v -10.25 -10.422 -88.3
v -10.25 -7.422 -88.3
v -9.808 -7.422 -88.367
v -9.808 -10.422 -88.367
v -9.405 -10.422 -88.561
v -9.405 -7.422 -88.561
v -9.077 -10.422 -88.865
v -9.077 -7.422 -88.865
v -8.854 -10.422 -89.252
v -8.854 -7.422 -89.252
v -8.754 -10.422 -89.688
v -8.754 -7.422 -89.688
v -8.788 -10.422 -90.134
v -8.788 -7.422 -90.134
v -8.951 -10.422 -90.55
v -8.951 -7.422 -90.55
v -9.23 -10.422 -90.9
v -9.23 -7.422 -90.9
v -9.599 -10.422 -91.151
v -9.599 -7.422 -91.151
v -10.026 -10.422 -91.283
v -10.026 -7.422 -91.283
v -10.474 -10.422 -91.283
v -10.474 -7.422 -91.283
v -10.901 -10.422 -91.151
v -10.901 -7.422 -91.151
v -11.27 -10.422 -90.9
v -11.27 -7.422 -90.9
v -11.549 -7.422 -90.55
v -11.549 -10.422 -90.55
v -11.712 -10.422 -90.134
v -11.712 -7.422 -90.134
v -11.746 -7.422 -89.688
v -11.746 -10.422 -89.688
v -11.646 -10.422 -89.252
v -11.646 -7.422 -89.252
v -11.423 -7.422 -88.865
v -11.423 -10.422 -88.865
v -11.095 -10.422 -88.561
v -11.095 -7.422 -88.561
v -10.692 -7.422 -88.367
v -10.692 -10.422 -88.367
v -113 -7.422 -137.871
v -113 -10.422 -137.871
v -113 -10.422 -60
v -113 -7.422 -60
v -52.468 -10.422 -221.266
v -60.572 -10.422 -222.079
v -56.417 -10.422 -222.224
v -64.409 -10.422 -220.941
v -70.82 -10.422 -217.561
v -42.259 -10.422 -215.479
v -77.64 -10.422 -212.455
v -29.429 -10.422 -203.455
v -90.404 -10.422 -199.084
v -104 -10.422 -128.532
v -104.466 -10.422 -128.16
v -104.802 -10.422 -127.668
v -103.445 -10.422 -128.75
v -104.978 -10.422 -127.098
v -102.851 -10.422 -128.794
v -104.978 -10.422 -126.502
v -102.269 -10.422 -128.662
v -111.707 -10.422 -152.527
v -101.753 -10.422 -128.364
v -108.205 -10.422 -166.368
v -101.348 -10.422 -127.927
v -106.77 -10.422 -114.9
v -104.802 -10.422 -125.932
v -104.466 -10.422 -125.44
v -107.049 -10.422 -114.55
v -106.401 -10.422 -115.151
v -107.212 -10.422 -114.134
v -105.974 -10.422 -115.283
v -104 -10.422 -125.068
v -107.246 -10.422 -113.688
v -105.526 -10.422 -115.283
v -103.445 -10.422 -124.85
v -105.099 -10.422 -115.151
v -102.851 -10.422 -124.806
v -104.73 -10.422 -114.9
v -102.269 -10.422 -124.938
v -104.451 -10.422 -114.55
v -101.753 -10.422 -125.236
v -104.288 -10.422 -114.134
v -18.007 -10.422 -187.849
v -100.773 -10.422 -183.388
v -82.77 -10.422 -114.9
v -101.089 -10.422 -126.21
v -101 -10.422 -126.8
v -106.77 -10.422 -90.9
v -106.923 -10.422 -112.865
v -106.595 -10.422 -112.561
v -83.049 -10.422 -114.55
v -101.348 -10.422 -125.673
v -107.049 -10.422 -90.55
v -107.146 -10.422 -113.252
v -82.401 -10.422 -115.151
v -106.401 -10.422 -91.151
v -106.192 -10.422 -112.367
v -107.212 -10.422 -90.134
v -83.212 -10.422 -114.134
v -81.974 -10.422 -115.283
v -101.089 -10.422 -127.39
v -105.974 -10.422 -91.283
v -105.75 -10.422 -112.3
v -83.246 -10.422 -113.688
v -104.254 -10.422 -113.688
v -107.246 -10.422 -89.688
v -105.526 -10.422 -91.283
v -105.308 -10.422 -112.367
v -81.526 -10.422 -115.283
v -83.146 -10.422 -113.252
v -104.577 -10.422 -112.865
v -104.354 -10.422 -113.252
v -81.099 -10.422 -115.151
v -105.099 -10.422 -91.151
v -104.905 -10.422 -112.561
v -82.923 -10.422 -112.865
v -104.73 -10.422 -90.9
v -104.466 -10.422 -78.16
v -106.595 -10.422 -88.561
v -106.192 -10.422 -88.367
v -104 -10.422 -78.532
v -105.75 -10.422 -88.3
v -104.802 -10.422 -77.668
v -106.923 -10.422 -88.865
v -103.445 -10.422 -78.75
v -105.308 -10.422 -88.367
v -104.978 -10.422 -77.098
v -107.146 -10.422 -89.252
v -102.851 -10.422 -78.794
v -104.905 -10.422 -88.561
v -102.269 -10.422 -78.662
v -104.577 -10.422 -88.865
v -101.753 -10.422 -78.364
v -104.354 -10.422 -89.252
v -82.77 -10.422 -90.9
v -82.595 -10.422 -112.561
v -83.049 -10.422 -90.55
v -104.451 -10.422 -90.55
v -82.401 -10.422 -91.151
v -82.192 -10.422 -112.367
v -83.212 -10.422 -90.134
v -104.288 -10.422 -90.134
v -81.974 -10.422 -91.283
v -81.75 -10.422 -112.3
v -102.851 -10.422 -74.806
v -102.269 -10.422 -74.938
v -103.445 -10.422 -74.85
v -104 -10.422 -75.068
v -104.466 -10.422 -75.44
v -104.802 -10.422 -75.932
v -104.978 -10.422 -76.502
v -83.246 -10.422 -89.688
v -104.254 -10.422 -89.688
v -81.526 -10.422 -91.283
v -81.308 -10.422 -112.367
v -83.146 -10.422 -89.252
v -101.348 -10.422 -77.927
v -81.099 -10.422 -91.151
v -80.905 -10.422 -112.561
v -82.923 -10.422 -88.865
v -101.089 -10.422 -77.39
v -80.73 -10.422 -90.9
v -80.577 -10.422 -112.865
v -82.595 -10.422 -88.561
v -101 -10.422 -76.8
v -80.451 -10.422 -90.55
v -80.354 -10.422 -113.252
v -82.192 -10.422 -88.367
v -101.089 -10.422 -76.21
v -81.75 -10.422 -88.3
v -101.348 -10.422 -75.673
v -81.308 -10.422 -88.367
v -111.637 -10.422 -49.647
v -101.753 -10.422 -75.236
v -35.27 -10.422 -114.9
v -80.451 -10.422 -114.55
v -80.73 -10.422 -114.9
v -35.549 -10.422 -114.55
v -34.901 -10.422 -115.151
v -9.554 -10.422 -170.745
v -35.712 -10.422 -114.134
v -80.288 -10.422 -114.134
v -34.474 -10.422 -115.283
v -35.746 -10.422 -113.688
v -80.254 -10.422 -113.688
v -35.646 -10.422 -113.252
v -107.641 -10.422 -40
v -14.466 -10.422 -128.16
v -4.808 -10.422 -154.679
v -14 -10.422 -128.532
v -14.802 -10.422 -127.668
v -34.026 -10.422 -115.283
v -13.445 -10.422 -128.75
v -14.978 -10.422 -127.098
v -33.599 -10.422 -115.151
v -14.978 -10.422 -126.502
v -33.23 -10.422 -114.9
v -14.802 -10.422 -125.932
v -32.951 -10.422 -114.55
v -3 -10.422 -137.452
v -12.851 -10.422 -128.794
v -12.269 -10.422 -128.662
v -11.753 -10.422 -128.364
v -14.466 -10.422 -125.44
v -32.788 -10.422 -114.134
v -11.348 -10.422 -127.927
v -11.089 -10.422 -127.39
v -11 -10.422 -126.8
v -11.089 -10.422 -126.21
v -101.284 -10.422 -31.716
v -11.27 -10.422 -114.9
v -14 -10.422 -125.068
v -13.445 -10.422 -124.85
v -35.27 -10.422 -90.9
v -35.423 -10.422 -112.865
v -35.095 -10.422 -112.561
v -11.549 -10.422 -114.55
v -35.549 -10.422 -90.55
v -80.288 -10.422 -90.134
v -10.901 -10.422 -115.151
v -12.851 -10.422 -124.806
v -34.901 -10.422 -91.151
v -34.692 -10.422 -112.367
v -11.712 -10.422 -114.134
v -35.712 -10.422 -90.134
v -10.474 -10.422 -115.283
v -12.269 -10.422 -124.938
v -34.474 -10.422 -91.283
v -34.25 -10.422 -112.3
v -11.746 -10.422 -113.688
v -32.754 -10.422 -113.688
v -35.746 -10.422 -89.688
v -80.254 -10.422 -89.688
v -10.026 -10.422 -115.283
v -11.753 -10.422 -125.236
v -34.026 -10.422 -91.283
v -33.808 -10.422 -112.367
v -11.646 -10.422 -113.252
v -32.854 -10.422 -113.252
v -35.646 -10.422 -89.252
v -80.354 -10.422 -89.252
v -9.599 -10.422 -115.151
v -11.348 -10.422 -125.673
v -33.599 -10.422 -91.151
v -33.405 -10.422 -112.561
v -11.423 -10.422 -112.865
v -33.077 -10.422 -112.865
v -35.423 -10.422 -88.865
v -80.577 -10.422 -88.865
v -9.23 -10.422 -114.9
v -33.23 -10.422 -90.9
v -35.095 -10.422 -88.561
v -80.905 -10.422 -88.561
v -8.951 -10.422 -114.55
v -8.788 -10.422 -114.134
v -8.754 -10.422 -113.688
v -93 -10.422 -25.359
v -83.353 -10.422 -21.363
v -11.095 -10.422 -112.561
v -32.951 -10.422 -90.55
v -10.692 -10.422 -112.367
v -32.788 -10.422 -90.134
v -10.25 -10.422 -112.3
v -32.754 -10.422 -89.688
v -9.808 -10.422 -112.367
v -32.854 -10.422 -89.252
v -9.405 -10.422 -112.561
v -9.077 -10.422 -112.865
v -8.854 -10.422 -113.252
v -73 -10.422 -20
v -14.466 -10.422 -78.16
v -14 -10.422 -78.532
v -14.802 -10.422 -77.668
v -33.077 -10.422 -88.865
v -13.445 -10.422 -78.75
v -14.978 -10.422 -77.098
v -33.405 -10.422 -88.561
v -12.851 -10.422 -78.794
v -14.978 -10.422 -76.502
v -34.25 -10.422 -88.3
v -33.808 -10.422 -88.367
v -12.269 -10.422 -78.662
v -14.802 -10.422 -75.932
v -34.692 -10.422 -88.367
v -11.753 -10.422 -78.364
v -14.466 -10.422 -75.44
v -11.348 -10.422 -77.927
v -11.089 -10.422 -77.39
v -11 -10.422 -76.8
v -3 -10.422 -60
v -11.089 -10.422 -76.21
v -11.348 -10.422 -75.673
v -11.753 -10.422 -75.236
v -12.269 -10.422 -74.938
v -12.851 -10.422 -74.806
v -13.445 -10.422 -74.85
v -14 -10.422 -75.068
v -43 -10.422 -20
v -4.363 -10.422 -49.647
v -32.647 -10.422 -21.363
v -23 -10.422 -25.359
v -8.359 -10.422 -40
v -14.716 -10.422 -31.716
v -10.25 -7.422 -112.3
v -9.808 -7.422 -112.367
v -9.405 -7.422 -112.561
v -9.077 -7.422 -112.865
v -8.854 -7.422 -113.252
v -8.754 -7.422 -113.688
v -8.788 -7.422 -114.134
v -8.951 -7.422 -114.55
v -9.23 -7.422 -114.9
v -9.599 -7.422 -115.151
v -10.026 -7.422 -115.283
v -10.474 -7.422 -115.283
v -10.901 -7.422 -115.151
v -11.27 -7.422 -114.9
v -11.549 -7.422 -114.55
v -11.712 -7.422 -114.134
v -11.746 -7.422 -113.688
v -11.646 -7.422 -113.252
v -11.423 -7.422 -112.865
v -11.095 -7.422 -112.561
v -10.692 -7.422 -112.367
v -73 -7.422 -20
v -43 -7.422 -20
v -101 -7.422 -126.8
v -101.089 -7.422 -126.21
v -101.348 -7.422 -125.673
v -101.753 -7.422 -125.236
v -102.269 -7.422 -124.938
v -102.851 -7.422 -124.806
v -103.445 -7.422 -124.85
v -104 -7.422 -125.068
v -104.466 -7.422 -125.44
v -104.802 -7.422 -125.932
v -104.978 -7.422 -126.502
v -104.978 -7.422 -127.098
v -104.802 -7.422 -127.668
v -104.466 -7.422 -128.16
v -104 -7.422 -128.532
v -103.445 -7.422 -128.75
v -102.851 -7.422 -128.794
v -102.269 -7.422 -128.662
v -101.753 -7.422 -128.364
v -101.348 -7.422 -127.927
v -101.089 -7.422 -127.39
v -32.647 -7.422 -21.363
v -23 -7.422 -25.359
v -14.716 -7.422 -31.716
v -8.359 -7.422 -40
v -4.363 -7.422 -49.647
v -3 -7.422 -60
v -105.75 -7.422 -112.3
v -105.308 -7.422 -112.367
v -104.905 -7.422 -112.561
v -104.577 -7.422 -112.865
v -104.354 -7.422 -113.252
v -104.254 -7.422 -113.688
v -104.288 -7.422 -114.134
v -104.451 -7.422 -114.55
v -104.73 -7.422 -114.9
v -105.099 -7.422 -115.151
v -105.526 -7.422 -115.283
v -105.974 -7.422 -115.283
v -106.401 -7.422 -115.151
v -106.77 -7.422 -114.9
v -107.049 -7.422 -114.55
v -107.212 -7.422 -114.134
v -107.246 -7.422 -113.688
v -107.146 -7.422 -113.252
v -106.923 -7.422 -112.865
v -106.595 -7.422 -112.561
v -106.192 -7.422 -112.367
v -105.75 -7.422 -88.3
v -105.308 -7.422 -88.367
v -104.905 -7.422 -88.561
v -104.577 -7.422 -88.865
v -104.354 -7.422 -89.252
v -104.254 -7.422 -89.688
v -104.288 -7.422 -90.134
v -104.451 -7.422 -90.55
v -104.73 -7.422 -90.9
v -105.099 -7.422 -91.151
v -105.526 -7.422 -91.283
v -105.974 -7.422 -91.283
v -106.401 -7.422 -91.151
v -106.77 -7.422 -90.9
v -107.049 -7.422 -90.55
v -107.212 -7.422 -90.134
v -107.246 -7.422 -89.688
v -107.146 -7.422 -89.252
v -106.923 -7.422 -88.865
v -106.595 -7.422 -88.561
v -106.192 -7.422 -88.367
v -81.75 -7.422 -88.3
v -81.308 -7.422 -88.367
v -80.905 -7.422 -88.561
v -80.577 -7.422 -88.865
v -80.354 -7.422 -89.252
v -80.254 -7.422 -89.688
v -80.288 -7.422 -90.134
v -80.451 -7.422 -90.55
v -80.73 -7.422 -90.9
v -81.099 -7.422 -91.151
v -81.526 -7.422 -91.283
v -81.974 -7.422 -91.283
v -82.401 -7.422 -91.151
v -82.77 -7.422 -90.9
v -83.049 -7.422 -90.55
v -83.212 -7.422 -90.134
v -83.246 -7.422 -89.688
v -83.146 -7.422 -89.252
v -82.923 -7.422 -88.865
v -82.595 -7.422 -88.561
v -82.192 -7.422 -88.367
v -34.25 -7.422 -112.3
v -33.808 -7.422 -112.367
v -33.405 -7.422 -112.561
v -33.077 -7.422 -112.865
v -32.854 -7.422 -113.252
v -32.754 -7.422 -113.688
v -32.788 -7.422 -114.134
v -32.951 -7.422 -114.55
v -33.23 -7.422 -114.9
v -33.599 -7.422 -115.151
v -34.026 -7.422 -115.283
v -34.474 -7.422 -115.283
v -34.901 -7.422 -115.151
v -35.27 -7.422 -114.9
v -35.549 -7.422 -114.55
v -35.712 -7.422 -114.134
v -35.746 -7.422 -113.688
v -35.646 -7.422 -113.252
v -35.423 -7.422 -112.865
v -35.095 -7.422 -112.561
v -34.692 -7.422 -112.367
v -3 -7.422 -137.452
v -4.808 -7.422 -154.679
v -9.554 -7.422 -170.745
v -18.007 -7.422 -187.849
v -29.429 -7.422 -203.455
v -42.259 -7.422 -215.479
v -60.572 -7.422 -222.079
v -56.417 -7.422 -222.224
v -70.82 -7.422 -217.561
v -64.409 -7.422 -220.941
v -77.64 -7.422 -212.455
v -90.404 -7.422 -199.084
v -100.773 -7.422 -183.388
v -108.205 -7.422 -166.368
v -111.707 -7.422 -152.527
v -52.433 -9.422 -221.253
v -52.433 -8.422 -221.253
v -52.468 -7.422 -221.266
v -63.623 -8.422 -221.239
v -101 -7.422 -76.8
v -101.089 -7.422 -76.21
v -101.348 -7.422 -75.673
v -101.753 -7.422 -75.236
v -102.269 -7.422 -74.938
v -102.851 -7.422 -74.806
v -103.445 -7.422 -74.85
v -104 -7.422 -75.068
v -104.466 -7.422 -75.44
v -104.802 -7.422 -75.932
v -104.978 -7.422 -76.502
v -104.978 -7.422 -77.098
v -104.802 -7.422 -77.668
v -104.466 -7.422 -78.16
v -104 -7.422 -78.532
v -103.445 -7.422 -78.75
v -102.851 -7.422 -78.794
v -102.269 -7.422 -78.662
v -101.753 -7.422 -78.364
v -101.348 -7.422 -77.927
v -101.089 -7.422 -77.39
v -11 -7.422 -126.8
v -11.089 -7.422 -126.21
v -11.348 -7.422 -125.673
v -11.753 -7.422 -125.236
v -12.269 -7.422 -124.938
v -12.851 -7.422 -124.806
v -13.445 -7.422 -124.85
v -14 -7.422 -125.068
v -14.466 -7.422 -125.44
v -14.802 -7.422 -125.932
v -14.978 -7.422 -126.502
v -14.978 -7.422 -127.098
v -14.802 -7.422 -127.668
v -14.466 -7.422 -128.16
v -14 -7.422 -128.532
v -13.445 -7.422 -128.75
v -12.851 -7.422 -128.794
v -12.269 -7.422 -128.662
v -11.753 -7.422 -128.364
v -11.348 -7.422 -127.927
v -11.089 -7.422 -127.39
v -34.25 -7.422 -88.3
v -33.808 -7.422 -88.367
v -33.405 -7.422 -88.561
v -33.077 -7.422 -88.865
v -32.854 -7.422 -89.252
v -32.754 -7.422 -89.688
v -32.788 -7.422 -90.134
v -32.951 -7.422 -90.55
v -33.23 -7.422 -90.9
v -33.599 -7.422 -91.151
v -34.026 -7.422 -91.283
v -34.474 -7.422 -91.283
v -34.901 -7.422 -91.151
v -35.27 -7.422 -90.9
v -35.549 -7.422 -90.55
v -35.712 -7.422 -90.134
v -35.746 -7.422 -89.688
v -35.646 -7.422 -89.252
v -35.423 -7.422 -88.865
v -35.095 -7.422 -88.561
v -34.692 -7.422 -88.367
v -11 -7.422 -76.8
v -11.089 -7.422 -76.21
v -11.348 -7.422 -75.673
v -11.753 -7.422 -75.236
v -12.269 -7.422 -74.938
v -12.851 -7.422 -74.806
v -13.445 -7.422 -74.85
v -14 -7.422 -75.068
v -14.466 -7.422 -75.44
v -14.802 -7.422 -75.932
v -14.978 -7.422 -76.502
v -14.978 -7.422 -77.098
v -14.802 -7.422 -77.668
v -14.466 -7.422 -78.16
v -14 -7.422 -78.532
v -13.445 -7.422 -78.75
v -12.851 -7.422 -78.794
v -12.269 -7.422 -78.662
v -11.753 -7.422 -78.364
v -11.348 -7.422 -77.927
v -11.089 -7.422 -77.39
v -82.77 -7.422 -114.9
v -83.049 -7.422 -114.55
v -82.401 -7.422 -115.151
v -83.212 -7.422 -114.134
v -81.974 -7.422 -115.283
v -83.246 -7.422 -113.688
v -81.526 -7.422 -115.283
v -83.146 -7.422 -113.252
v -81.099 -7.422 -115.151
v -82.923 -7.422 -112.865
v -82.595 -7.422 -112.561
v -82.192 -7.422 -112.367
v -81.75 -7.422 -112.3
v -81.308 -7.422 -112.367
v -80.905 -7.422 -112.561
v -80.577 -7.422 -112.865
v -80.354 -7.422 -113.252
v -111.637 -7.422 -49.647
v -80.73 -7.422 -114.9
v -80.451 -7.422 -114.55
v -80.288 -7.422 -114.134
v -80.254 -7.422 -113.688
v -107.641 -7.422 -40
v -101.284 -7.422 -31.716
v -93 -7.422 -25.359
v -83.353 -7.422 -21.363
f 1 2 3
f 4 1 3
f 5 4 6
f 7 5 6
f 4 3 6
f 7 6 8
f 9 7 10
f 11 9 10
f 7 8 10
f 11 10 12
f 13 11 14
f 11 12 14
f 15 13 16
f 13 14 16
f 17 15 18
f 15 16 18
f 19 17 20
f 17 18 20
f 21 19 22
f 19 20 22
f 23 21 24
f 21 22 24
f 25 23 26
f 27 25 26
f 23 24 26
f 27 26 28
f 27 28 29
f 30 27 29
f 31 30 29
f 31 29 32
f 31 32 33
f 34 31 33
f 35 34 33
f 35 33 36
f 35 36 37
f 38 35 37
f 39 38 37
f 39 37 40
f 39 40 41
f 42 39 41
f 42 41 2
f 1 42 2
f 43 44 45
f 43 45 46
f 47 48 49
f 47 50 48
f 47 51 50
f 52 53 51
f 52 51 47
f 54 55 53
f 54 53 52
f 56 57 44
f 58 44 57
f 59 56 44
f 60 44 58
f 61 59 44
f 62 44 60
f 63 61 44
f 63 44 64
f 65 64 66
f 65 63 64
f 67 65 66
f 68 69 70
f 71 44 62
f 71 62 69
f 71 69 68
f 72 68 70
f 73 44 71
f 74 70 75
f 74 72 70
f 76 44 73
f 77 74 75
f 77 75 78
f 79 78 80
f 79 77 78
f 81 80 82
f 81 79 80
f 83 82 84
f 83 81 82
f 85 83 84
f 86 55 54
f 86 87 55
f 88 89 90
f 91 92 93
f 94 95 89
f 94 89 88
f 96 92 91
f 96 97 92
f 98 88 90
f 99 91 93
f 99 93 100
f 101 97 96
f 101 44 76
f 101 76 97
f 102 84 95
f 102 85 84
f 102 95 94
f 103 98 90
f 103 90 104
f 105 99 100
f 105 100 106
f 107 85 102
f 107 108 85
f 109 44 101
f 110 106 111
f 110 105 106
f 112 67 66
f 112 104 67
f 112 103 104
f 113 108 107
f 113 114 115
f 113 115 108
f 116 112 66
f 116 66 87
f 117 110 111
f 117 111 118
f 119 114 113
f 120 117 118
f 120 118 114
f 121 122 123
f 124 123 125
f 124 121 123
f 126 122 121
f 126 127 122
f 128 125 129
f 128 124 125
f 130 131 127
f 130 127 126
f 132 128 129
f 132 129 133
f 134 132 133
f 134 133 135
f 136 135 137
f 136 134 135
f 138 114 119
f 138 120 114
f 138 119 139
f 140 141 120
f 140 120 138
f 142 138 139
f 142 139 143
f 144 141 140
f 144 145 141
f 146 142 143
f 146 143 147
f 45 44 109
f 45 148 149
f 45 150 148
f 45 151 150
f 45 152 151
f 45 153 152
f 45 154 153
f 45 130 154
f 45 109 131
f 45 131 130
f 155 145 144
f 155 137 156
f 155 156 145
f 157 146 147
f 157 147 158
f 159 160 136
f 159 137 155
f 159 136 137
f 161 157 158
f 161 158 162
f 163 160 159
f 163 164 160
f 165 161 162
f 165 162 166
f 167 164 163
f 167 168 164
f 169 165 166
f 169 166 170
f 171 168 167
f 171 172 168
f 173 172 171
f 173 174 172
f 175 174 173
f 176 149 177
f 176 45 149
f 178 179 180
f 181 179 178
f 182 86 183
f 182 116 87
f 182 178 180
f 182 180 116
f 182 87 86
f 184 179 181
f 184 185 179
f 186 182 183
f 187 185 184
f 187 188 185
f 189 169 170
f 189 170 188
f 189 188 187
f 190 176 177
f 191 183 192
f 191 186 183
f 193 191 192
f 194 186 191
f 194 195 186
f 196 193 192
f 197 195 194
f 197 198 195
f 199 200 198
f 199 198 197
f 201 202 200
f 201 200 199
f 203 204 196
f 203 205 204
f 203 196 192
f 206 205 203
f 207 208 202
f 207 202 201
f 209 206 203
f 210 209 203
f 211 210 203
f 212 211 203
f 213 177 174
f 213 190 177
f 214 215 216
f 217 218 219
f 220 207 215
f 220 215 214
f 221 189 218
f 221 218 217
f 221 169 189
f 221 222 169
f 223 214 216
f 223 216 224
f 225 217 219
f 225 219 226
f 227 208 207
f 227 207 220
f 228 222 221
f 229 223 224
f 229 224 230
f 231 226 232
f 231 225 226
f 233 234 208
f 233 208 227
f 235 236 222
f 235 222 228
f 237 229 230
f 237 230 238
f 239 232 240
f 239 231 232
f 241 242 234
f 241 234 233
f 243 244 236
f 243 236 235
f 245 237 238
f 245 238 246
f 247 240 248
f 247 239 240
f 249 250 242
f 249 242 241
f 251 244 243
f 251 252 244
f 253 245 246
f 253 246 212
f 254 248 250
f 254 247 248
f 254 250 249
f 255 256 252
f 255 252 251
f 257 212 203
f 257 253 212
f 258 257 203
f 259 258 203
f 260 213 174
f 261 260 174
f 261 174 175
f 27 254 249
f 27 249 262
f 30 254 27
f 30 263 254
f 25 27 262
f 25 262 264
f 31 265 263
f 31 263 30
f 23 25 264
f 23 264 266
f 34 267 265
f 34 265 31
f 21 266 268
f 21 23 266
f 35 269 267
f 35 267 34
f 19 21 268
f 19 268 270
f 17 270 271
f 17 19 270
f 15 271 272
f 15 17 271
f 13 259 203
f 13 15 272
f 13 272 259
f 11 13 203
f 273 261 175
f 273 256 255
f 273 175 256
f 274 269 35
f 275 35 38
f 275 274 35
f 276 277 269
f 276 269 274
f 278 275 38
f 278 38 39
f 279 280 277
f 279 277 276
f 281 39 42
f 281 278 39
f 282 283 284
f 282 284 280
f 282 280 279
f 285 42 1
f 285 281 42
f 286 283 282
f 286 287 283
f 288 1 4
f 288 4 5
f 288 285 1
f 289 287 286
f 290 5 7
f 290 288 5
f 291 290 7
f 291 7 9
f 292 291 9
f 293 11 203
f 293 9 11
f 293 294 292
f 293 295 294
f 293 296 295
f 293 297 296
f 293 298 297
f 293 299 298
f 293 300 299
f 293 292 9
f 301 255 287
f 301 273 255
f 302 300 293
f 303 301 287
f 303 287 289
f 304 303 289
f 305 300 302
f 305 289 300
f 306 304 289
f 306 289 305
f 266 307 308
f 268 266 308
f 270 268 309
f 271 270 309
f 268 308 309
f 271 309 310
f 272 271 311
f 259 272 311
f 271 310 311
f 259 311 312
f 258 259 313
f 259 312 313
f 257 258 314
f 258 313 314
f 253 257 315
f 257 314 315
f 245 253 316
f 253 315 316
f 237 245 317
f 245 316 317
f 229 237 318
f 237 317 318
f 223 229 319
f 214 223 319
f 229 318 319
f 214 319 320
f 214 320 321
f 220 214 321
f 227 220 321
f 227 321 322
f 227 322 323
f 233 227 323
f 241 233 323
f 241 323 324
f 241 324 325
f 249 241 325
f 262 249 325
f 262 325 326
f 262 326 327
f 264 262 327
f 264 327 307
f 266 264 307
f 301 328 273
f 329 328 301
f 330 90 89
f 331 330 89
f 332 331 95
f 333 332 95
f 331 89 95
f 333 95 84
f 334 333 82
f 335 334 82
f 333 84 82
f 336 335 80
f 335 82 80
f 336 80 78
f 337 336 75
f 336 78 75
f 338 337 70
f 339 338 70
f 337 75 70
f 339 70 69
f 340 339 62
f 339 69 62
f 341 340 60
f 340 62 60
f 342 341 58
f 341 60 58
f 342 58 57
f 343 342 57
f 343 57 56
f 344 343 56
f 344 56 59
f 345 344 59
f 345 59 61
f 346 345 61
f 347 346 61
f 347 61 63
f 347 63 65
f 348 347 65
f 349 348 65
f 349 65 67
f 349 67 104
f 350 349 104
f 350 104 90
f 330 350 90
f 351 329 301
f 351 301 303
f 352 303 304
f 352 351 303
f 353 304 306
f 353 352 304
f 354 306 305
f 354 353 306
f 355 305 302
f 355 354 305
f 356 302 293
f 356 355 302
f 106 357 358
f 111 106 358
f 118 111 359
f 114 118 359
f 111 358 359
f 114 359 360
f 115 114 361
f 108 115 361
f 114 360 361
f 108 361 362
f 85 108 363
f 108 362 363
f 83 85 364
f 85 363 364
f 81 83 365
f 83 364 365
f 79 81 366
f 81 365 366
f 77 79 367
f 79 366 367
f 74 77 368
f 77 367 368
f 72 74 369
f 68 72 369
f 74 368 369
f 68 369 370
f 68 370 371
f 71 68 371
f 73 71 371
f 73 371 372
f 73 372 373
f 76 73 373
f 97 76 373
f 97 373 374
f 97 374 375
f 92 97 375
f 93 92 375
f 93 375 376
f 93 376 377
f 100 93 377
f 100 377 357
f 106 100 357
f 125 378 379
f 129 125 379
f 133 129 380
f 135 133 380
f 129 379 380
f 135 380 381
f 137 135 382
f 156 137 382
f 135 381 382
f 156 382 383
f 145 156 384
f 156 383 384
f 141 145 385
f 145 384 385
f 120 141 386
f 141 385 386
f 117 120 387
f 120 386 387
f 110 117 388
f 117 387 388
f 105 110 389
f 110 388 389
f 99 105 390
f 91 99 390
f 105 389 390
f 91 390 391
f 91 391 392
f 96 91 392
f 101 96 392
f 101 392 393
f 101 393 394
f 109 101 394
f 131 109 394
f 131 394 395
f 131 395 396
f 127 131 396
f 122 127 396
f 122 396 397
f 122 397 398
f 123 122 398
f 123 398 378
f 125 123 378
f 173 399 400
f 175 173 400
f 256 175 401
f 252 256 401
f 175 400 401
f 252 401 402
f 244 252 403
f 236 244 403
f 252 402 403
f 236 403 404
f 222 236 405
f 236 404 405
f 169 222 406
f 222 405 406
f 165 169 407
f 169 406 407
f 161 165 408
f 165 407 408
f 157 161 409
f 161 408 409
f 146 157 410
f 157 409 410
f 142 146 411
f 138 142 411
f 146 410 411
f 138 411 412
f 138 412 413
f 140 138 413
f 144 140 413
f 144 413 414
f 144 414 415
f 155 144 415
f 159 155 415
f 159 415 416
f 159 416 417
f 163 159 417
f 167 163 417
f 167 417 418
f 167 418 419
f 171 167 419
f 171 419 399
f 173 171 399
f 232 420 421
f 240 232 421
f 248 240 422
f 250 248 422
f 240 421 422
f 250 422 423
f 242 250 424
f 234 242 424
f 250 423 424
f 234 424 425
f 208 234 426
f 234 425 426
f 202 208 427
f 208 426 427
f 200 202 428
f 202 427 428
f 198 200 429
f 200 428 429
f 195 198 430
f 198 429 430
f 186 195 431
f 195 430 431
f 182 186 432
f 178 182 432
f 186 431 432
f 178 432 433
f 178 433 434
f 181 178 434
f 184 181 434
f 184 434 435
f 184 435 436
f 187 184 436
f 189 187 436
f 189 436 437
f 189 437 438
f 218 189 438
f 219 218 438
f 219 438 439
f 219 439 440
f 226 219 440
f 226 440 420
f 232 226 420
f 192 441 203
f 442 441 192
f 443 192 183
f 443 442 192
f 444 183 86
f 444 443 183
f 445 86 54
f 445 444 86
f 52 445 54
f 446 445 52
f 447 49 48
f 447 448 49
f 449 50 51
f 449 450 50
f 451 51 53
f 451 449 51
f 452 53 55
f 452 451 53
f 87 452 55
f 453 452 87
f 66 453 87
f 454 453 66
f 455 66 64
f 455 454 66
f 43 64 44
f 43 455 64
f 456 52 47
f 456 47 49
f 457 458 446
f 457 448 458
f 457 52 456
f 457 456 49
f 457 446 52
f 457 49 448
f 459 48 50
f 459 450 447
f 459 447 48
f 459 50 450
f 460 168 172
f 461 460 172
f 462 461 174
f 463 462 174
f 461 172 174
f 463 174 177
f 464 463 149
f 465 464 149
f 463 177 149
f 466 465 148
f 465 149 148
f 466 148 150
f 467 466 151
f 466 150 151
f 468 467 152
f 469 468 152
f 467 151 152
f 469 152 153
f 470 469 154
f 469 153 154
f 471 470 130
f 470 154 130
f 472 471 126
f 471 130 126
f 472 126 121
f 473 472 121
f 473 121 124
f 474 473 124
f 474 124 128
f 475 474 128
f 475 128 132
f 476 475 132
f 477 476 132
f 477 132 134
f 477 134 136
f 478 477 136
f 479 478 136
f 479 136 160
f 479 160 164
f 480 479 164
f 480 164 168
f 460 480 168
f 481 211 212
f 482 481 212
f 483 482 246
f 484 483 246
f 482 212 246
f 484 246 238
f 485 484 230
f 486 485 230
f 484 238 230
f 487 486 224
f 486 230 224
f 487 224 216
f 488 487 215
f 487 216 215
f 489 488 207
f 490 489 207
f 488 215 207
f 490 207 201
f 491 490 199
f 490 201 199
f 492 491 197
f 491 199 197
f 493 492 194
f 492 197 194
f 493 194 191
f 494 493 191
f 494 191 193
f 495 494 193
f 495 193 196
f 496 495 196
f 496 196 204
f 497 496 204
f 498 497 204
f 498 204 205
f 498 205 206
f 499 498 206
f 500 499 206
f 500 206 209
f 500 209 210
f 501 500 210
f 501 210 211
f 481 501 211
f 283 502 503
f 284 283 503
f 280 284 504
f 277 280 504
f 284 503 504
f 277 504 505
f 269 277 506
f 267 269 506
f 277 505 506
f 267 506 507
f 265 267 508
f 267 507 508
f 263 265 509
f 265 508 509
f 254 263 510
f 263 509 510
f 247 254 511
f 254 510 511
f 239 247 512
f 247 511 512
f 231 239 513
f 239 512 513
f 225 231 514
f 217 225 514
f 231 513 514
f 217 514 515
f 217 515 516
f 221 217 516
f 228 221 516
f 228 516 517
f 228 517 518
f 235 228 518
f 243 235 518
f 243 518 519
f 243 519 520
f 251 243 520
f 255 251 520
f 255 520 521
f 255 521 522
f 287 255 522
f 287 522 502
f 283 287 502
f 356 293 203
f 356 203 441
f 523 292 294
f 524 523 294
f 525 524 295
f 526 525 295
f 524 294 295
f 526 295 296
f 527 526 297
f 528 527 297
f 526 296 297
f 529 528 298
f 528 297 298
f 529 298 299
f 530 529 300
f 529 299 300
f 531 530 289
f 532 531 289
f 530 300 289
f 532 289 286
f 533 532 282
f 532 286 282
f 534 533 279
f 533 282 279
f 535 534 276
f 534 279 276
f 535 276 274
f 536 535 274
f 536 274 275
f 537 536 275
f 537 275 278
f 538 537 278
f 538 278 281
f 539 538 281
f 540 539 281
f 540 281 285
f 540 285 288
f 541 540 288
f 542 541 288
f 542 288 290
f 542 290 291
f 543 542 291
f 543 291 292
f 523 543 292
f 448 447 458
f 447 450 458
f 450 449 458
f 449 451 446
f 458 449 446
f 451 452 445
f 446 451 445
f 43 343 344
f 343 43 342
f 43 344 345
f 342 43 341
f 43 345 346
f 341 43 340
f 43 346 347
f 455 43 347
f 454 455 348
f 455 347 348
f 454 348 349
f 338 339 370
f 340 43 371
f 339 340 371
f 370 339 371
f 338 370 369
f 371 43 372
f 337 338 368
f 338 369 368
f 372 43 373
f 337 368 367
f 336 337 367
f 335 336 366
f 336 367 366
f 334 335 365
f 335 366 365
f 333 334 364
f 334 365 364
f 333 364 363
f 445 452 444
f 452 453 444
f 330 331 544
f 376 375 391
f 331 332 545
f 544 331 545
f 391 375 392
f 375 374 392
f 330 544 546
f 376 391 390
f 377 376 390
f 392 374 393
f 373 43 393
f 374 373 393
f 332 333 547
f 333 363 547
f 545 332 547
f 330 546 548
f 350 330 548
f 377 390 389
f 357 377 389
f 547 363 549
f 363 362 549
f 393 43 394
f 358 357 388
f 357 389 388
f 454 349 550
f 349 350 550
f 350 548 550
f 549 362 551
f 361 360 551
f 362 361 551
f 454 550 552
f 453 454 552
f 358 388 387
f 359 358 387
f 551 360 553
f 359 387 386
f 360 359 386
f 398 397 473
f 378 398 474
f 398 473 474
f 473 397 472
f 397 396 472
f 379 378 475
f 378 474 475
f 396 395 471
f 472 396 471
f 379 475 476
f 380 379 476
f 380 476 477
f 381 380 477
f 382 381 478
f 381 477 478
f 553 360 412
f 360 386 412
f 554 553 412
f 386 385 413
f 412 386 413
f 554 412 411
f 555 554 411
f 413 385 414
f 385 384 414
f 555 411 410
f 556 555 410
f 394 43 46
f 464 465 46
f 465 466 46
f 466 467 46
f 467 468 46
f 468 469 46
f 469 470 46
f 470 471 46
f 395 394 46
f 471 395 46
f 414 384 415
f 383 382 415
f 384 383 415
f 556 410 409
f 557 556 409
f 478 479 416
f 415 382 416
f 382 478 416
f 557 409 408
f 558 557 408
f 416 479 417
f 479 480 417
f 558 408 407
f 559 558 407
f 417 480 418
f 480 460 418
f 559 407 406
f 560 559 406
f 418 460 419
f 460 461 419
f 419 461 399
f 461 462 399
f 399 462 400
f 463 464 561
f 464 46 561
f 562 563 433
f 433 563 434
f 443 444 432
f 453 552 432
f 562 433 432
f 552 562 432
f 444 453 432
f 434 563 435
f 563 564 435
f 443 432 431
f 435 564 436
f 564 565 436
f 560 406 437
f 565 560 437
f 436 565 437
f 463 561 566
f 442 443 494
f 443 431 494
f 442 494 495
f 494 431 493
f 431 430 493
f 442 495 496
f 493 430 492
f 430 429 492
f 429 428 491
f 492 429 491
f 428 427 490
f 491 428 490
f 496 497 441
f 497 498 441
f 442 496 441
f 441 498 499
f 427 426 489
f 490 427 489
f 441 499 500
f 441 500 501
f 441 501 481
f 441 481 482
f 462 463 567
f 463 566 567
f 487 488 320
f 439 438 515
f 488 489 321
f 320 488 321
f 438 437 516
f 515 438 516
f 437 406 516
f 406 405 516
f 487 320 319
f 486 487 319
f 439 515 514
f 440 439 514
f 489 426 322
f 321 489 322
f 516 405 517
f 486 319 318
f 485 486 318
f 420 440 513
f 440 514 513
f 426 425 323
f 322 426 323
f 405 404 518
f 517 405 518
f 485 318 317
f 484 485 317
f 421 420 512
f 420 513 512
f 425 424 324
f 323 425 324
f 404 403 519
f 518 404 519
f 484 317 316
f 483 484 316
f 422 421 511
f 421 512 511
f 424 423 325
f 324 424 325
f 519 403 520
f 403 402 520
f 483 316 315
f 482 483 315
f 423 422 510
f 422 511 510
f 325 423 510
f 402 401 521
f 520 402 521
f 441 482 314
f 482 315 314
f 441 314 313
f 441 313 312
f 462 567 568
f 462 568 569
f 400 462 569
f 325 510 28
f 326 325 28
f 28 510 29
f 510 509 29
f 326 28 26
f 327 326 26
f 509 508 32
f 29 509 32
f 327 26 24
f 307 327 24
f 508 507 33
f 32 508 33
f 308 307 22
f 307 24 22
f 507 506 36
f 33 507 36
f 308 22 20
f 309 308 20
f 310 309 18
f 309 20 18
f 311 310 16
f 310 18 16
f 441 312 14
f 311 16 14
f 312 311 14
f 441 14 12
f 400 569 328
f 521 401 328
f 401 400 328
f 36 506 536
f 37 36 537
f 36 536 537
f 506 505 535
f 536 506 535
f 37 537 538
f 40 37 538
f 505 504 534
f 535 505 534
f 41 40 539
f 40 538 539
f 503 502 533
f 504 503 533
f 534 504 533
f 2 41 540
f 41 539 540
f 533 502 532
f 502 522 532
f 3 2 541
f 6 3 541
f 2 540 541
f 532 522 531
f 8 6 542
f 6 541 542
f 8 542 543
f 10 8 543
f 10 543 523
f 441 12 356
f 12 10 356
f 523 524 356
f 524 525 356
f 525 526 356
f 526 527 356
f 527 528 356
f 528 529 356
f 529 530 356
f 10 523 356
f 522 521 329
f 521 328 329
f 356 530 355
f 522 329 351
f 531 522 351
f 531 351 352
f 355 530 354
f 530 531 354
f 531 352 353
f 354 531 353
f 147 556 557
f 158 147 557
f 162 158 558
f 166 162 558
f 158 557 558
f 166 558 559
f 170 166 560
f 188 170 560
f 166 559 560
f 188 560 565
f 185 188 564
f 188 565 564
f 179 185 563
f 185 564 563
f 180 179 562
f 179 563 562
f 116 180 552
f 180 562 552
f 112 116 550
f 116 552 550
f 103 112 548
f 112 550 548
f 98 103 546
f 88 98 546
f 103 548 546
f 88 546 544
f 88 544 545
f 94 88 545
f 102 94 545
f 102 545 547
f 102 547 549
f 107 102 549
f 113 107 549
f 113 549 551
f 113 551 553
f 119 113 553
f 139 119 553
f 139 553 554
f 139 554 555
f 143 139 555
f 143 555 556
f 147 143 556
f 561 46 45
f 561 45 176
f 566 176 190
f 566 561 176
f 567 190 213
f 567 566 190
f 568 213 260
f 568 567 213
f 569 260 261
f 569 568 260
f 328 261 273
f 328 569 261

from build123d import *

# Parameters (mm, degrees)
SKETCH1_W             = 110
SKETCH1_H             = 3
BASE_FLANGE1_DEPTH    = 223.6
EXTRUDE1_START        = -3
EXTRUDE1_DEPTH        = 3
SKETCH10_R            = 2
CUT_EXTRUDE1_DEPTH    = 250.402876475
M3X0_5_TAPPED_HOLE1_D = 3


# Read off the part's stored shape, not the designer's step: Extrude1
# Sheet-metal steps are written as plain solids
with BuildPart() as part:
    # Sketch1 → Base-Flange1 (new body)
    with BuildSketch(Plane.XY):
        with Locations((-58, -8.92226979)):
            Rectangle(SKETCH1_W, SKETCH1_H)
    extrude(amount=-BASE_FLANGE1_DEPTH)

    # Extrude1 outline → Extrude1 (cut)
    with BuildSketch(Plane.XZ.offset(10.42226979).offset(EXTRUDE1_START)):
        with BuildLine():
            Line((-3, -223.6), (-3, -137.451520334))
            add(Edge.make_bspline(
                [(-3, -137.451520334), (-3.217256351, -179.540007851), (-41.744610068, -222.771946497), (-74.471641553, -222.568569391), (-112.895413513, -179.867413692), (-113.000000023, -137.871391115)],
                knots=[0, 0, 0, 0, 0.447091033, 0.547091033, 0.998496472, 0.998496472, 0.998496472, 0.998496472], degree=3))
            Line((-113.000000023, -137.871391115), (-113, -223.6))
            Line((-113, -223.6), (-3, -223.6))
        make_face()
        with BuildLine():
            ThreePointArc((-43, -20), (-14.715728753, -31.715728753), (-3, -60))
            Line((-3, -60), (-3, 0))
            Line((-3, 0), (-113, 0))
            Line((-113, 0), (-113, -60))
            ThreePointArc((-113, -60), (-101.284271247, -31.715728753), (-73, -20))
            Line((-73, -20), (-43, -20))
        make_face()
    extrude(amount=EXTRUDE1_DEPTH, mode=Mode.SUBTRACT)

    # Sketch10 → Cut-Extrude1 (cut, through all)
    with BuildSketch(Plane.XZ.offset(10.42226979)):
        with Locations((-13, -126.8)):
            Circle(SKETCH10_R)
        with Locations((-13, -76.8)):
            Circle(SKETCH10_R)
        with Locations((-103, -126.8)):
            Circle(SKETCH10_R)
        with Locations((-103, -76.8)):
            Circle(SKETCH10_R)
    extrude(amount=-CUT_EXTRUDE1_DEPTH, mode=Mode.SUBTRACT)

    # M3x0.5 Tapped Hole1 (through all)
    with Locations(Plane(origin=(-105.75, -10.42226979, -89.8), x_dir=(0, 0, -1), z_dir=(0, -1, 0))):
        with Locations((0, 0), (24, 0), (24, 24), (0, 24), (0, 71.5), (24, 71.5), (24, 95.5), (0, 95.5)):
            Hole(M3X0_5_TAPPED_HOLE1_D / 2)


solid = part.part
